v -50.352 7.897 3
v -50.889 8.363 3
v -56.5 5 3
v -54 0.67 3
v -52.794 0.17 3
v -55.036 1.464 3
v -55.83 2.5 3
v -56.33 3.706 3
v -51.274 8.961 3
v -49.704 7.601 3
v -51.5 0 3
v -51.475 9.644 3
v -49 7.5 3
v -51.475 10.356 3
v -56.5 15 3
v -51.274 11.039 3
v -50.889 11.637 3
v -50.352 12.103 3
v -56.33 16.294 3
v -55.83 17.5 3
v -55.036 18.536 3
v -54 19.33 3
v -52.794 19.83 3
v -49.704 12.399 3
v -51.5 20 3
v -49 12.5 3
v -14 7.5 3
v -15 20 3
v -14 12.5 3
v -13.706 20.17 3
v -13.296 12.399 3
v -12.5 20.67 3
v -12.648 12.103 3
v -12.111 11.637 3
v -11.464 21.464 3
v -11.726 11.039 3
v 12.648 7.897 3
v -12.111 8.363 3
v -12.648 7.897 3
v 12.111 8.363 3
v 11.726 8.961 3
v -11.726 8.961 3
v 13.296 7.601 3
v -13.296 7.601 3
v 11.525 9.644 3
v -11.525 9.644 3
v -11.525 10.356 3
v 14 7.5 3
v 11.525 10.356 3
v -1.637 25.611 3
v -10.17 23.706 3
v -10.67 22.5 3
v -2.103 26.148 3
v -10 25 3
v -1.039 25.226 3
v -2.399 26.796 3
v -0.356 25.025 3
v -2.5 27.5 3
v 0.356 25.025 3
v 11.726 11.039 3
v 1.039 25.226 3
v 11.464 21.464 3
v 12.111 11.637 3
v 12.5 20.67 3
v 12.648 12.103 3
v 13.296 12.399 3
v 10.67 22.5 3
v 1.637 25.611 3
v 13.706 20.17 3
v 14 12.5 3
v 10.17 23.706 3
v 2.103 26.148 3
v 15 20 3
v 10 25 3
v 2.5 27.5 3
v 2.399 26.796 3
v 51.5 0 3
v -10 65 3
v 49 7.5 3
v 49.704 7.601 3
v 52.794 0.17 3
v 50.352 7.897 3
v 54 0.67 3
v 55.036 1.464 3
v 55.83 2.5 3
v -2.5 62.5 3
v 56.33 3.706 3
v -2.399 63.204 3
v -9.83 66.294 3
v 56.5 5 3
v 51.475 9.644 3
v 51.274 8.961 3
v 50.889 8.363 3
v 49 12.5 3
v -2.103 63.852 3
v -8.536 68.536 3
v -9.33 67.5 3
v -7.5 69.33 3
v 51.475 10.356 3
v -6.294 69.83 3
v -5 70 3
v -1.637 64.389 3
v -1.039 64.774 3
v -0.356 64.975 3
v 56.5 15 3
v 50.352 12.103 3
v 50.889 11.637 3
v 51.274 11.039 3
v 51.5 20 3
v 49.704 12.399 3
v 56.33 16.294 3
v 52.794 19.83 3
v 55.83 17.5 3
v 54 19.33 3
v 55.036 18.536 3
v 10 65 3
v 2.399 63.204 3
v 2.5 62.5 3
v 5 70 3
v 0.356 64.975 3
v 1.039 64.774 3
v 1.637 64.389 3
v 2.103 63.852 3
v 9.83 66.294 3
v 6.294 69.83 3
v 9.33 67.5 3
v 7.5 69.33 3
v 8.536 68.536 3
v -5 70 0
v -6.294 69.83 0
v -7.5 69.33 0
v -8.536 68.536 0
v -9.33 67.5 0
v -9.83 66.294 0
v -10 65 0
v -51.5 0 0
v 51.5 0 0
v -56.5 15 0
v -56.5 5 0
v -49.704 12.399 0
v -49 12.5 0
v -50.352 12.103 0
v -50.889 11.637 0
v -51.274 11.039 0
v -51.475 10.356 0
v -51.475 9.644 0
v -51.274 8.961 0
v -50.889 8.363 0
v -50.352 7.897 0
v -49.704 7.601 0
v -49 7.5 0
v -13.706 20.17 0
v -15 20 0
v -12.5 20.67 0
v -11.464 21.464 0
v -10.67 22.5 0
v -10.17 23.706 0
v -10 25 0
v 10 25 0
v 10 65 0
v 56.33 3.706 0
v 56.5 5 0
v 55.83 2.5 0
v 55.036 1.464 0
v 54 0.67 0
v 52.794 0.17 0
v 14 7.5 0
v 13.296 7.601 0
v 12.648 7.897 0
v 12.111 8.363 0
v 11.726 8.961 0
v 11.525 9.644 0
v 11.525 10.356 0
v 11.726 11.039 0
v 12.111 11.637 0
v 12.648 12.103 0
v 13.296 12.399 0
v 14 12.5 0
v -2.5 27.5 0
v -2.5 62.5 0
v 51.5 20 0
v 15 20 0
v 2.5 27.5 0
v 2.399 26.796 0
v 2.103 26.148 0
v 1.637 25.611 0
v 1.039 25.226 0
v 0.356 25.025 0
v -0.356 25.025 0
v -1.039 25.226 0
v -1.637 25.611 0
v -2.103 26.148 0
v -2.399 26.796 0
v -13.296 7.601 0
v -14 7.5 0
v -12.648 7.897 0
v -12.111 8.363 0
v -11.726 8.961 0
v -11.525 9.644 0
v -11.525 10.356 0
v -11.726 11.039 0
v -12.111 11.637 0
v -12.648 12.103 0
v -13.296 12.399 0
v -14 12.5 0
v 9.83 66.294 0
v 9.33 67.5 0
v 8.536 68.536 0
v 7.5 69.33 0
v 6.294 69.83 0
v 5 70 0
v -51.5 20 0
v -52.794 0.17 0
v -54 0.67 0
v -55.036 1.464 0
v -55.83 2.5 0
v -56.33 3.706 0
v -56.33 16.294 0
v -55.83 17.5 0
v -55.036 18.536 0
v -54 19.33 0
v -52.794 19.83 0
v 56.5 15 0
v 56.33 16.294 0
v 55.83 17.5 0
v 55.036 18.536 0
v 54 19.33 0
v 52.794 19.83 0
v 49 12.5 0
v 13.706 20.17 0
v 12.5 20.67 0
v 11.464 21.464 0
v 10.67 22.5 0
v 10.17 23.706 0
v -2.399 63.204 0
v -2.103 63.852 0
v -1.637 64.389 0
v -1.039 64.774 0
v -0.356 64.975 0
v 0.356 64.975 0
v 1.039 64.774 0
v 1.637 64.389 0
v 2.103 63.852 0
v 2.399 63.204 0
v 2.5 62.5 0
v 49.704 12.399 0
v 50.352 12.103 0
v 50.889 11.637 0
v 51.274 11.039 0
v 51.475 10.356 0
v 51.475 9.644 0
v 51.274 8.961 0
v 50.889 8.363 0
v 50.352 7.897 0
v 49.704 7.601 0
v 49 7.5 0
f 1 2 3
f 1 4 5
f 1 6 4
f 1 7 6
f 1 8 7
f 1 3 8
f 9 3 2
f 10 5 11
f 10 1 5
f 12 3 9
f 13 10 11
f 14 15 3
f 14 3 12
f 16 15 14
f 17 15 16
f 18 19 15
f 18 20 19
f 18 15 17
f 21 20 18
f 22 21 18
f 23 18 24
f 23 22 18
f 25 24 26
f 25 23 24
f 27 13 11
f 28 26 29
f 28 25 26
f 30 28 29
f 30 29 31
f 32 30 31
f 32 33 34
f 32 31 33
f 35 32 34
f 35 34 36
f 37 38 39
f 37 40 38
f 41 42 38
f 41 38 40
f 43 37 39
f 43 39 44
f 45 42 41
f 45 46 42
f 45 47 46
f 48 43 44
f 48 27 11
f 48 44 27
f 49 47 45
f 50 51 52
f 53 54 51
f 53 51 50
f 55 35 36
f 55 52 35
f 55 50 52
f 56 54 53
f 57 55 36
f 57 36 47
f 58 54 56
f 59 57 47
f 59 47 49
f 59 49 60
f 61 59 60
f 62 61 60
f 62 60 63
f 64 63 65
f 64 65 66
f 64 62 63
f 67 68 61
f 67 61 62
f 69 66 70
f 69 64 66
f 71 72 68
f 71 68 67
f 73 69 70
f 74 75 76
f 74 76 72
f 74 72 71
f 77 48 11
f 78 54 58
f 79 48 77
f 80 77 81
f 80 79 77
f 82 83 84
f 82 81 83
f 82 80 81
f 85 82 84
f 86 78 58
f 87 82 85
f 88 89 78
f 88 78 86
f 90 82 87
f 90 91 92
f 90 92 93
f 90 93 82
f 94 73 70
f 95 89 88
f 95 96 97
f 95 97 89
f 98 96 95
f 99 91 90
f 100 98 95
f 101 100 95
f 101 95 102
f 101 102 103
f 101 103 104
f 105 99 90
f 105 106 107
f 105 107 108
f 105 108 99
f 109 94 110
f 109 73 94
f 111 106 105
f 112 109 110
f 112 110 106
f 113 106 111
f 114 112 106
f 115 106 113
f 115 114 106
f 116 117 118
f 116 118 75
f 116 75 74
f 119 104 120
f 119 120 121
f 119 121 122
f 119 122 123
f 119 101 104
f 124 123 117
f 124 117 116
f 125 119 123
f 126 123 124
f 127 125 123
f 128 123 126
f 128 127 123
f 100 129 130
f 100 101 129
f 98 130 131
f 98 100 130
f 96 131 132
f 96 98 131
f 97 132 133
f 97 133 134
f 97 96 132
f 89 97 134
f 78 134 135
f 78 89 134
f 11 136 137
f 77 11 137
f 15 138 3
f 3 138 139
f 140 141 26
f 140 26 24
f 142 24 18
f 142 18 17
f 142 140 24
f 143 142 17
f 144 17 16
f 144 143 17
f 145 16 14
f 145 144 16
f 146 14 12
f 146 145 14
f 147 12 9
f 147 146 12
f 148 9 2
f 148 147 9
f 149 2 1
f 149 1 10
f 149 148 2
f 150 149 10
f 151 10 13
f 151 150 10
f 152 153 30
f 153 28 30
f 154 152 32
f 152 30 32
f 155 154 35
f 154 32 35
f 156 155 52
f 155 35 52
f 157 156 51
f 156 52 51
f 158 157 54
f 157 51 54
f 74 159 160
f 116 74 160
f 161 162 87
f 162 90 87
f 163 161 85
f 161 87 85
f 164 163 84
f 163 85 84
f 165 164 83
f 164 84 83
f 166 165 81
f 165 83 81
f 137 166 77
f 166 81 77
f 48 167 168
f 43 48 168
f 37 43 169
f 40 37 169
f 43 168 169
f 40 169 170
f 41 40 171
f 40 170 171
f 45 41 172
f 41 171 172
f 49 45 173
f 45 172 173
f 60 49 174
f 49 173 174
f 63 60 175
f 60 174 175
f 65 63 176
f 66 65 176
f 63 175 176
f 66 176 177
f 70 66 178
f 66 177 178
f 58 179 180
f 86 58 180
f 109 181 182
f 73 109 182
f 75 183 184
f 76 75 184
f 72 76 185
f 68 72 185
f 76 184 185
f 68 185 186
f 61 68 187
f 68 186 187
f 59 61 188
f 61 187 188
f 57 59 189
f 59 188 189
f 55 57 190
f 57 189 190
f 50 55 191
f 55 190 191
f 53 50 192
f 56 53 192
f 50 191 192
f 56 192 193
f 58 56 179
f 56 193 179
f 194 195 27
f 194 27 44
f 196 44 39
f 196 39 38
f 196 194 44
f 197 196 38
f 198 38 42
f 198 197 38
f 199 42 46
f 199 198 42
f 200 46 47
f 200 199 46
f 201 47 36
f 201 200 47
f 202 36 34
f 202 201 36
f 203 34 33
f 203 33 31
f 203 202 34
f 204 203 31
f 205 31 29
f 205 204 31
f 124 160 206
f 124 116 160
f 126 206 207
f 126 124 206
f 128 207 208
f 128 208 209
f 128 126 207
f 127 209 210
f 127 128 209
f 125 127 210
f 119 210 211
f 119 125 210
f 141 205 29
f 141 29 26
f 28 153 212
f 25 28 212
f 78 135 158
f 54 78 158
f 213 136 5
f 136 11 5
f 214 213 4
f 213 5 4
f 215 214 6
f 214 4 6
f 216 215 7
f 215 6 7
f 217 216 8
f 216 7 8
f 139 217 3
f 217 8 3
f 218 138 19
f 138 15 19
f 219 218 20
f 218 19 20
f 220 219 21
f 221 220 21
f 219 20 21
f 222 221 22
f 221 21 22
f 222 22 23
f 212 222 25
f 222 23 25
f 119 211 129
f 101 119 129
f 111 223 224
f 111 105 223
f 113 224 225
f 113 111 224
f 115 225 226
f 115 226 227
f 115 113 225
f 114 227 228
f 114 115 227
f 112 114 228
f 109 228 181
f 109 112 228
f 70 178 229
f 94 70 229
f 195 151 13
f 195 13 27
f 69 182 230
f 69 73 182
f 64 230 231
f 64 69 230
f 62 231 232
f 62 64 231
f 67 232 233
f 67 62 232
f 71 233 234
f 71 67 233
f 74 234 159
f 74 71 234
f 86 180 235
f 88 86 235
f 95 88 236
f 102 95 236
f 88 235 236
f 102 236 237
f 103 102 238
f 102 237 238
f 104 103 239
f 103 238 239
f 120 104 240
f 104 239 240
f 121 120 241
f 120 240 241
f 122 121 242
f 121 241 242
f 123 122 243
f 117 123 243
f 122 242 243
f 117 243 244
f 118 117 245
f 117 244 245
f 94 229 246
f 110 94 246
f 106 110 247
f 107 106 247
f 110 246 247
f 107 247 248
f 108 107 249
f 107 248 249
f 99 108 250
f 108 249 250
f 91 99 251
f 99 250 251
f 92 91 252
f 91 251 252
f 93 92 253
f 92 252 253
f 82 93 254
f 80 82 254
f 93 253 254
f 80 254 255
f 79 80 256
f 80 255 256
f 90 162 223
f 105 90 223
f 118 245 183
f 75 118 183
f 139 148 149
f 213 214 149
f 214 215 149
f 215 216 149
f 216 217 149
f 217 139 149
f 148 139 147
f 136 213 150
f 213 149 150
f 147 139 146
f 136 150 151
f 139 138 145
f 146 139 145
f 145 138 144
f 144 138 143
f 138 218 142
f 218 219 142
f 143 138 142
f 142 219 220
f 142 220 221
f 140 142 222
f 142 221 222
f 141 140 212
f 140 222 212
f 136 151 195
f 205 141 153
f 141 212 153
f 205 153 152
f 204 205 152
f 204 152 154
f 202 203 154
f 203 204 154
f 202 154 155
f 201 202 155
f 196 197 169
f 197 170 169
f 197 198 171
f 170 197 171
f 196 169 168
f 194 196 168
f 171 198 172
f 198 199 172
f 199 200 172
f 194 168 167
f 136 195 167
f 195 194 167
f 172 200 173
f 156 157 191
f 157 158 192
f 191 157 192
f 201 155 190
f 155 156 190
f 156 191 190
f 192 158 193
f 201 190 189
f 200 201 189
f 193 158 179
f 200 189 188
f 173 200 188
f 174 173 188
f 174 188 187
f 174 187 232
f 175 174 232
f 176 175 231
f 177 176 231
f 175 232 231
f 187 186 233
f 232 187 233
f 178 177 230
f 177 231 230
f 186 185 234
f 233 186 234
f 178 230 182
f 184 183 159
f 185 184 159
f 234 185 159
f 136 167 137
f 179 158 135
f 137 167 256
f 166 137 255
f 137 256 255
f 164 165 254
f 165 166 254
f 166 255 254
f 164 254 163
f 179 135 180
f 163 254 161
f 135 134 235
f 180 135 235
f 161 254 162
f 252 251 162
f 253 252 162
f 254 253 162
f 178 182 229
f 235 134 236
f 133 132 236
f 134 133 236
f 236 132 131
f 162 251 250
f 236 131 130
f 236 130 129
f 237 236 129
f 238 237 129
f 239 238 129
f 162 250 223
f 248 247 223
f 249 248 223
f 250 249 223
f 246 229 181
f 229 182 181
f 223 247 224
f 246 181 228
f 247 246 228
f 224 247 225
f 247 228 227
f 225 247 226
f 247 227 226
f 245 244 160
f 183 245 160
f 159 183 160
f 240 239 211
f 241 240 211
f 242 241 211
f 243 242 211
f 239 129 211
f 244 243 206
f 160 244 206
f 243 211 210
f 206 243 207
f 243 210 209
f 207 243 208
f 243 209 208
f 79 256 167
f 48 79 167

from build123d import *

# Parameters (mm, degrees)
BOSS_EXTRUDE1_DEPTH = 3
FILLET1_R           = 5


with BuildPart() as part:
    # Sketch1 → Boss-Extrude1 (new body)
    with BuildSketch(Plane.XY):
        Polygon((0, 0), (56.5, 0), (56.5, 20), (10, 20), (10, 70), (-10, 70), (-10, 20), (-56.5, 20), (-56.5, 0), align=None)
        with BuildLine():
            Line((2.5, 62.5), (2.5, 27.5))
            ThreePointArc((2.5, 27.5), (0, 25), (-2.5, 27.5))
            Line((-2.5, 27.5), (-2.5, 62.5))
            ThreePointArc((-2.5, 62.5), (0, 65), (2.5, 62.5))
        make_face(mode=Mode.SUBTRACT)
        with BuildLine():
            Line((49, 7.5), (14, 7.5))
            ThreePointArc((14, 7.5), (11.5, 10), (14, 12.5))
            Line((14, 12.5), (49, 12.5))
            ThreePointArc((49, 12.5), (51.5, 10), (49, 7.5))
        make_face(mode=Mode.SUBTRACT)
        with BuildLine():
            Line((-49, 7.5), (-14, 7.5))
            ThreePointArc((-14, 7.5), (-11.5, 10), (-14, 12.5))
            Line((-14, 12.5), (-49, 12.5))
            ThreePointArc((-49, 12.5), (-51.5, 10), (-49, 7.5))
        make_face(mode=Mode.SUBTRACT)
    extrude(amount=BOSS_EXTRUDE1_DEPTH)

    # Fillet1
    fillet1_edges = [part.edges().sort_by_distance(p)[0] for p in [
        (-10, 70, 1.5),
        (10, 70, 1.5),
        (10, 20, 1.5),
        (56.5, 20, 1.5),
        (56.5, 0, 1.5),
        (-56.5, 0, 1.5),
        (-56.5, 20, 1.5),
        (-10, 20, 1.5),
    ]]
    fillet(fillet1_edges, radius=FILLET1_R)


solid = part.part
